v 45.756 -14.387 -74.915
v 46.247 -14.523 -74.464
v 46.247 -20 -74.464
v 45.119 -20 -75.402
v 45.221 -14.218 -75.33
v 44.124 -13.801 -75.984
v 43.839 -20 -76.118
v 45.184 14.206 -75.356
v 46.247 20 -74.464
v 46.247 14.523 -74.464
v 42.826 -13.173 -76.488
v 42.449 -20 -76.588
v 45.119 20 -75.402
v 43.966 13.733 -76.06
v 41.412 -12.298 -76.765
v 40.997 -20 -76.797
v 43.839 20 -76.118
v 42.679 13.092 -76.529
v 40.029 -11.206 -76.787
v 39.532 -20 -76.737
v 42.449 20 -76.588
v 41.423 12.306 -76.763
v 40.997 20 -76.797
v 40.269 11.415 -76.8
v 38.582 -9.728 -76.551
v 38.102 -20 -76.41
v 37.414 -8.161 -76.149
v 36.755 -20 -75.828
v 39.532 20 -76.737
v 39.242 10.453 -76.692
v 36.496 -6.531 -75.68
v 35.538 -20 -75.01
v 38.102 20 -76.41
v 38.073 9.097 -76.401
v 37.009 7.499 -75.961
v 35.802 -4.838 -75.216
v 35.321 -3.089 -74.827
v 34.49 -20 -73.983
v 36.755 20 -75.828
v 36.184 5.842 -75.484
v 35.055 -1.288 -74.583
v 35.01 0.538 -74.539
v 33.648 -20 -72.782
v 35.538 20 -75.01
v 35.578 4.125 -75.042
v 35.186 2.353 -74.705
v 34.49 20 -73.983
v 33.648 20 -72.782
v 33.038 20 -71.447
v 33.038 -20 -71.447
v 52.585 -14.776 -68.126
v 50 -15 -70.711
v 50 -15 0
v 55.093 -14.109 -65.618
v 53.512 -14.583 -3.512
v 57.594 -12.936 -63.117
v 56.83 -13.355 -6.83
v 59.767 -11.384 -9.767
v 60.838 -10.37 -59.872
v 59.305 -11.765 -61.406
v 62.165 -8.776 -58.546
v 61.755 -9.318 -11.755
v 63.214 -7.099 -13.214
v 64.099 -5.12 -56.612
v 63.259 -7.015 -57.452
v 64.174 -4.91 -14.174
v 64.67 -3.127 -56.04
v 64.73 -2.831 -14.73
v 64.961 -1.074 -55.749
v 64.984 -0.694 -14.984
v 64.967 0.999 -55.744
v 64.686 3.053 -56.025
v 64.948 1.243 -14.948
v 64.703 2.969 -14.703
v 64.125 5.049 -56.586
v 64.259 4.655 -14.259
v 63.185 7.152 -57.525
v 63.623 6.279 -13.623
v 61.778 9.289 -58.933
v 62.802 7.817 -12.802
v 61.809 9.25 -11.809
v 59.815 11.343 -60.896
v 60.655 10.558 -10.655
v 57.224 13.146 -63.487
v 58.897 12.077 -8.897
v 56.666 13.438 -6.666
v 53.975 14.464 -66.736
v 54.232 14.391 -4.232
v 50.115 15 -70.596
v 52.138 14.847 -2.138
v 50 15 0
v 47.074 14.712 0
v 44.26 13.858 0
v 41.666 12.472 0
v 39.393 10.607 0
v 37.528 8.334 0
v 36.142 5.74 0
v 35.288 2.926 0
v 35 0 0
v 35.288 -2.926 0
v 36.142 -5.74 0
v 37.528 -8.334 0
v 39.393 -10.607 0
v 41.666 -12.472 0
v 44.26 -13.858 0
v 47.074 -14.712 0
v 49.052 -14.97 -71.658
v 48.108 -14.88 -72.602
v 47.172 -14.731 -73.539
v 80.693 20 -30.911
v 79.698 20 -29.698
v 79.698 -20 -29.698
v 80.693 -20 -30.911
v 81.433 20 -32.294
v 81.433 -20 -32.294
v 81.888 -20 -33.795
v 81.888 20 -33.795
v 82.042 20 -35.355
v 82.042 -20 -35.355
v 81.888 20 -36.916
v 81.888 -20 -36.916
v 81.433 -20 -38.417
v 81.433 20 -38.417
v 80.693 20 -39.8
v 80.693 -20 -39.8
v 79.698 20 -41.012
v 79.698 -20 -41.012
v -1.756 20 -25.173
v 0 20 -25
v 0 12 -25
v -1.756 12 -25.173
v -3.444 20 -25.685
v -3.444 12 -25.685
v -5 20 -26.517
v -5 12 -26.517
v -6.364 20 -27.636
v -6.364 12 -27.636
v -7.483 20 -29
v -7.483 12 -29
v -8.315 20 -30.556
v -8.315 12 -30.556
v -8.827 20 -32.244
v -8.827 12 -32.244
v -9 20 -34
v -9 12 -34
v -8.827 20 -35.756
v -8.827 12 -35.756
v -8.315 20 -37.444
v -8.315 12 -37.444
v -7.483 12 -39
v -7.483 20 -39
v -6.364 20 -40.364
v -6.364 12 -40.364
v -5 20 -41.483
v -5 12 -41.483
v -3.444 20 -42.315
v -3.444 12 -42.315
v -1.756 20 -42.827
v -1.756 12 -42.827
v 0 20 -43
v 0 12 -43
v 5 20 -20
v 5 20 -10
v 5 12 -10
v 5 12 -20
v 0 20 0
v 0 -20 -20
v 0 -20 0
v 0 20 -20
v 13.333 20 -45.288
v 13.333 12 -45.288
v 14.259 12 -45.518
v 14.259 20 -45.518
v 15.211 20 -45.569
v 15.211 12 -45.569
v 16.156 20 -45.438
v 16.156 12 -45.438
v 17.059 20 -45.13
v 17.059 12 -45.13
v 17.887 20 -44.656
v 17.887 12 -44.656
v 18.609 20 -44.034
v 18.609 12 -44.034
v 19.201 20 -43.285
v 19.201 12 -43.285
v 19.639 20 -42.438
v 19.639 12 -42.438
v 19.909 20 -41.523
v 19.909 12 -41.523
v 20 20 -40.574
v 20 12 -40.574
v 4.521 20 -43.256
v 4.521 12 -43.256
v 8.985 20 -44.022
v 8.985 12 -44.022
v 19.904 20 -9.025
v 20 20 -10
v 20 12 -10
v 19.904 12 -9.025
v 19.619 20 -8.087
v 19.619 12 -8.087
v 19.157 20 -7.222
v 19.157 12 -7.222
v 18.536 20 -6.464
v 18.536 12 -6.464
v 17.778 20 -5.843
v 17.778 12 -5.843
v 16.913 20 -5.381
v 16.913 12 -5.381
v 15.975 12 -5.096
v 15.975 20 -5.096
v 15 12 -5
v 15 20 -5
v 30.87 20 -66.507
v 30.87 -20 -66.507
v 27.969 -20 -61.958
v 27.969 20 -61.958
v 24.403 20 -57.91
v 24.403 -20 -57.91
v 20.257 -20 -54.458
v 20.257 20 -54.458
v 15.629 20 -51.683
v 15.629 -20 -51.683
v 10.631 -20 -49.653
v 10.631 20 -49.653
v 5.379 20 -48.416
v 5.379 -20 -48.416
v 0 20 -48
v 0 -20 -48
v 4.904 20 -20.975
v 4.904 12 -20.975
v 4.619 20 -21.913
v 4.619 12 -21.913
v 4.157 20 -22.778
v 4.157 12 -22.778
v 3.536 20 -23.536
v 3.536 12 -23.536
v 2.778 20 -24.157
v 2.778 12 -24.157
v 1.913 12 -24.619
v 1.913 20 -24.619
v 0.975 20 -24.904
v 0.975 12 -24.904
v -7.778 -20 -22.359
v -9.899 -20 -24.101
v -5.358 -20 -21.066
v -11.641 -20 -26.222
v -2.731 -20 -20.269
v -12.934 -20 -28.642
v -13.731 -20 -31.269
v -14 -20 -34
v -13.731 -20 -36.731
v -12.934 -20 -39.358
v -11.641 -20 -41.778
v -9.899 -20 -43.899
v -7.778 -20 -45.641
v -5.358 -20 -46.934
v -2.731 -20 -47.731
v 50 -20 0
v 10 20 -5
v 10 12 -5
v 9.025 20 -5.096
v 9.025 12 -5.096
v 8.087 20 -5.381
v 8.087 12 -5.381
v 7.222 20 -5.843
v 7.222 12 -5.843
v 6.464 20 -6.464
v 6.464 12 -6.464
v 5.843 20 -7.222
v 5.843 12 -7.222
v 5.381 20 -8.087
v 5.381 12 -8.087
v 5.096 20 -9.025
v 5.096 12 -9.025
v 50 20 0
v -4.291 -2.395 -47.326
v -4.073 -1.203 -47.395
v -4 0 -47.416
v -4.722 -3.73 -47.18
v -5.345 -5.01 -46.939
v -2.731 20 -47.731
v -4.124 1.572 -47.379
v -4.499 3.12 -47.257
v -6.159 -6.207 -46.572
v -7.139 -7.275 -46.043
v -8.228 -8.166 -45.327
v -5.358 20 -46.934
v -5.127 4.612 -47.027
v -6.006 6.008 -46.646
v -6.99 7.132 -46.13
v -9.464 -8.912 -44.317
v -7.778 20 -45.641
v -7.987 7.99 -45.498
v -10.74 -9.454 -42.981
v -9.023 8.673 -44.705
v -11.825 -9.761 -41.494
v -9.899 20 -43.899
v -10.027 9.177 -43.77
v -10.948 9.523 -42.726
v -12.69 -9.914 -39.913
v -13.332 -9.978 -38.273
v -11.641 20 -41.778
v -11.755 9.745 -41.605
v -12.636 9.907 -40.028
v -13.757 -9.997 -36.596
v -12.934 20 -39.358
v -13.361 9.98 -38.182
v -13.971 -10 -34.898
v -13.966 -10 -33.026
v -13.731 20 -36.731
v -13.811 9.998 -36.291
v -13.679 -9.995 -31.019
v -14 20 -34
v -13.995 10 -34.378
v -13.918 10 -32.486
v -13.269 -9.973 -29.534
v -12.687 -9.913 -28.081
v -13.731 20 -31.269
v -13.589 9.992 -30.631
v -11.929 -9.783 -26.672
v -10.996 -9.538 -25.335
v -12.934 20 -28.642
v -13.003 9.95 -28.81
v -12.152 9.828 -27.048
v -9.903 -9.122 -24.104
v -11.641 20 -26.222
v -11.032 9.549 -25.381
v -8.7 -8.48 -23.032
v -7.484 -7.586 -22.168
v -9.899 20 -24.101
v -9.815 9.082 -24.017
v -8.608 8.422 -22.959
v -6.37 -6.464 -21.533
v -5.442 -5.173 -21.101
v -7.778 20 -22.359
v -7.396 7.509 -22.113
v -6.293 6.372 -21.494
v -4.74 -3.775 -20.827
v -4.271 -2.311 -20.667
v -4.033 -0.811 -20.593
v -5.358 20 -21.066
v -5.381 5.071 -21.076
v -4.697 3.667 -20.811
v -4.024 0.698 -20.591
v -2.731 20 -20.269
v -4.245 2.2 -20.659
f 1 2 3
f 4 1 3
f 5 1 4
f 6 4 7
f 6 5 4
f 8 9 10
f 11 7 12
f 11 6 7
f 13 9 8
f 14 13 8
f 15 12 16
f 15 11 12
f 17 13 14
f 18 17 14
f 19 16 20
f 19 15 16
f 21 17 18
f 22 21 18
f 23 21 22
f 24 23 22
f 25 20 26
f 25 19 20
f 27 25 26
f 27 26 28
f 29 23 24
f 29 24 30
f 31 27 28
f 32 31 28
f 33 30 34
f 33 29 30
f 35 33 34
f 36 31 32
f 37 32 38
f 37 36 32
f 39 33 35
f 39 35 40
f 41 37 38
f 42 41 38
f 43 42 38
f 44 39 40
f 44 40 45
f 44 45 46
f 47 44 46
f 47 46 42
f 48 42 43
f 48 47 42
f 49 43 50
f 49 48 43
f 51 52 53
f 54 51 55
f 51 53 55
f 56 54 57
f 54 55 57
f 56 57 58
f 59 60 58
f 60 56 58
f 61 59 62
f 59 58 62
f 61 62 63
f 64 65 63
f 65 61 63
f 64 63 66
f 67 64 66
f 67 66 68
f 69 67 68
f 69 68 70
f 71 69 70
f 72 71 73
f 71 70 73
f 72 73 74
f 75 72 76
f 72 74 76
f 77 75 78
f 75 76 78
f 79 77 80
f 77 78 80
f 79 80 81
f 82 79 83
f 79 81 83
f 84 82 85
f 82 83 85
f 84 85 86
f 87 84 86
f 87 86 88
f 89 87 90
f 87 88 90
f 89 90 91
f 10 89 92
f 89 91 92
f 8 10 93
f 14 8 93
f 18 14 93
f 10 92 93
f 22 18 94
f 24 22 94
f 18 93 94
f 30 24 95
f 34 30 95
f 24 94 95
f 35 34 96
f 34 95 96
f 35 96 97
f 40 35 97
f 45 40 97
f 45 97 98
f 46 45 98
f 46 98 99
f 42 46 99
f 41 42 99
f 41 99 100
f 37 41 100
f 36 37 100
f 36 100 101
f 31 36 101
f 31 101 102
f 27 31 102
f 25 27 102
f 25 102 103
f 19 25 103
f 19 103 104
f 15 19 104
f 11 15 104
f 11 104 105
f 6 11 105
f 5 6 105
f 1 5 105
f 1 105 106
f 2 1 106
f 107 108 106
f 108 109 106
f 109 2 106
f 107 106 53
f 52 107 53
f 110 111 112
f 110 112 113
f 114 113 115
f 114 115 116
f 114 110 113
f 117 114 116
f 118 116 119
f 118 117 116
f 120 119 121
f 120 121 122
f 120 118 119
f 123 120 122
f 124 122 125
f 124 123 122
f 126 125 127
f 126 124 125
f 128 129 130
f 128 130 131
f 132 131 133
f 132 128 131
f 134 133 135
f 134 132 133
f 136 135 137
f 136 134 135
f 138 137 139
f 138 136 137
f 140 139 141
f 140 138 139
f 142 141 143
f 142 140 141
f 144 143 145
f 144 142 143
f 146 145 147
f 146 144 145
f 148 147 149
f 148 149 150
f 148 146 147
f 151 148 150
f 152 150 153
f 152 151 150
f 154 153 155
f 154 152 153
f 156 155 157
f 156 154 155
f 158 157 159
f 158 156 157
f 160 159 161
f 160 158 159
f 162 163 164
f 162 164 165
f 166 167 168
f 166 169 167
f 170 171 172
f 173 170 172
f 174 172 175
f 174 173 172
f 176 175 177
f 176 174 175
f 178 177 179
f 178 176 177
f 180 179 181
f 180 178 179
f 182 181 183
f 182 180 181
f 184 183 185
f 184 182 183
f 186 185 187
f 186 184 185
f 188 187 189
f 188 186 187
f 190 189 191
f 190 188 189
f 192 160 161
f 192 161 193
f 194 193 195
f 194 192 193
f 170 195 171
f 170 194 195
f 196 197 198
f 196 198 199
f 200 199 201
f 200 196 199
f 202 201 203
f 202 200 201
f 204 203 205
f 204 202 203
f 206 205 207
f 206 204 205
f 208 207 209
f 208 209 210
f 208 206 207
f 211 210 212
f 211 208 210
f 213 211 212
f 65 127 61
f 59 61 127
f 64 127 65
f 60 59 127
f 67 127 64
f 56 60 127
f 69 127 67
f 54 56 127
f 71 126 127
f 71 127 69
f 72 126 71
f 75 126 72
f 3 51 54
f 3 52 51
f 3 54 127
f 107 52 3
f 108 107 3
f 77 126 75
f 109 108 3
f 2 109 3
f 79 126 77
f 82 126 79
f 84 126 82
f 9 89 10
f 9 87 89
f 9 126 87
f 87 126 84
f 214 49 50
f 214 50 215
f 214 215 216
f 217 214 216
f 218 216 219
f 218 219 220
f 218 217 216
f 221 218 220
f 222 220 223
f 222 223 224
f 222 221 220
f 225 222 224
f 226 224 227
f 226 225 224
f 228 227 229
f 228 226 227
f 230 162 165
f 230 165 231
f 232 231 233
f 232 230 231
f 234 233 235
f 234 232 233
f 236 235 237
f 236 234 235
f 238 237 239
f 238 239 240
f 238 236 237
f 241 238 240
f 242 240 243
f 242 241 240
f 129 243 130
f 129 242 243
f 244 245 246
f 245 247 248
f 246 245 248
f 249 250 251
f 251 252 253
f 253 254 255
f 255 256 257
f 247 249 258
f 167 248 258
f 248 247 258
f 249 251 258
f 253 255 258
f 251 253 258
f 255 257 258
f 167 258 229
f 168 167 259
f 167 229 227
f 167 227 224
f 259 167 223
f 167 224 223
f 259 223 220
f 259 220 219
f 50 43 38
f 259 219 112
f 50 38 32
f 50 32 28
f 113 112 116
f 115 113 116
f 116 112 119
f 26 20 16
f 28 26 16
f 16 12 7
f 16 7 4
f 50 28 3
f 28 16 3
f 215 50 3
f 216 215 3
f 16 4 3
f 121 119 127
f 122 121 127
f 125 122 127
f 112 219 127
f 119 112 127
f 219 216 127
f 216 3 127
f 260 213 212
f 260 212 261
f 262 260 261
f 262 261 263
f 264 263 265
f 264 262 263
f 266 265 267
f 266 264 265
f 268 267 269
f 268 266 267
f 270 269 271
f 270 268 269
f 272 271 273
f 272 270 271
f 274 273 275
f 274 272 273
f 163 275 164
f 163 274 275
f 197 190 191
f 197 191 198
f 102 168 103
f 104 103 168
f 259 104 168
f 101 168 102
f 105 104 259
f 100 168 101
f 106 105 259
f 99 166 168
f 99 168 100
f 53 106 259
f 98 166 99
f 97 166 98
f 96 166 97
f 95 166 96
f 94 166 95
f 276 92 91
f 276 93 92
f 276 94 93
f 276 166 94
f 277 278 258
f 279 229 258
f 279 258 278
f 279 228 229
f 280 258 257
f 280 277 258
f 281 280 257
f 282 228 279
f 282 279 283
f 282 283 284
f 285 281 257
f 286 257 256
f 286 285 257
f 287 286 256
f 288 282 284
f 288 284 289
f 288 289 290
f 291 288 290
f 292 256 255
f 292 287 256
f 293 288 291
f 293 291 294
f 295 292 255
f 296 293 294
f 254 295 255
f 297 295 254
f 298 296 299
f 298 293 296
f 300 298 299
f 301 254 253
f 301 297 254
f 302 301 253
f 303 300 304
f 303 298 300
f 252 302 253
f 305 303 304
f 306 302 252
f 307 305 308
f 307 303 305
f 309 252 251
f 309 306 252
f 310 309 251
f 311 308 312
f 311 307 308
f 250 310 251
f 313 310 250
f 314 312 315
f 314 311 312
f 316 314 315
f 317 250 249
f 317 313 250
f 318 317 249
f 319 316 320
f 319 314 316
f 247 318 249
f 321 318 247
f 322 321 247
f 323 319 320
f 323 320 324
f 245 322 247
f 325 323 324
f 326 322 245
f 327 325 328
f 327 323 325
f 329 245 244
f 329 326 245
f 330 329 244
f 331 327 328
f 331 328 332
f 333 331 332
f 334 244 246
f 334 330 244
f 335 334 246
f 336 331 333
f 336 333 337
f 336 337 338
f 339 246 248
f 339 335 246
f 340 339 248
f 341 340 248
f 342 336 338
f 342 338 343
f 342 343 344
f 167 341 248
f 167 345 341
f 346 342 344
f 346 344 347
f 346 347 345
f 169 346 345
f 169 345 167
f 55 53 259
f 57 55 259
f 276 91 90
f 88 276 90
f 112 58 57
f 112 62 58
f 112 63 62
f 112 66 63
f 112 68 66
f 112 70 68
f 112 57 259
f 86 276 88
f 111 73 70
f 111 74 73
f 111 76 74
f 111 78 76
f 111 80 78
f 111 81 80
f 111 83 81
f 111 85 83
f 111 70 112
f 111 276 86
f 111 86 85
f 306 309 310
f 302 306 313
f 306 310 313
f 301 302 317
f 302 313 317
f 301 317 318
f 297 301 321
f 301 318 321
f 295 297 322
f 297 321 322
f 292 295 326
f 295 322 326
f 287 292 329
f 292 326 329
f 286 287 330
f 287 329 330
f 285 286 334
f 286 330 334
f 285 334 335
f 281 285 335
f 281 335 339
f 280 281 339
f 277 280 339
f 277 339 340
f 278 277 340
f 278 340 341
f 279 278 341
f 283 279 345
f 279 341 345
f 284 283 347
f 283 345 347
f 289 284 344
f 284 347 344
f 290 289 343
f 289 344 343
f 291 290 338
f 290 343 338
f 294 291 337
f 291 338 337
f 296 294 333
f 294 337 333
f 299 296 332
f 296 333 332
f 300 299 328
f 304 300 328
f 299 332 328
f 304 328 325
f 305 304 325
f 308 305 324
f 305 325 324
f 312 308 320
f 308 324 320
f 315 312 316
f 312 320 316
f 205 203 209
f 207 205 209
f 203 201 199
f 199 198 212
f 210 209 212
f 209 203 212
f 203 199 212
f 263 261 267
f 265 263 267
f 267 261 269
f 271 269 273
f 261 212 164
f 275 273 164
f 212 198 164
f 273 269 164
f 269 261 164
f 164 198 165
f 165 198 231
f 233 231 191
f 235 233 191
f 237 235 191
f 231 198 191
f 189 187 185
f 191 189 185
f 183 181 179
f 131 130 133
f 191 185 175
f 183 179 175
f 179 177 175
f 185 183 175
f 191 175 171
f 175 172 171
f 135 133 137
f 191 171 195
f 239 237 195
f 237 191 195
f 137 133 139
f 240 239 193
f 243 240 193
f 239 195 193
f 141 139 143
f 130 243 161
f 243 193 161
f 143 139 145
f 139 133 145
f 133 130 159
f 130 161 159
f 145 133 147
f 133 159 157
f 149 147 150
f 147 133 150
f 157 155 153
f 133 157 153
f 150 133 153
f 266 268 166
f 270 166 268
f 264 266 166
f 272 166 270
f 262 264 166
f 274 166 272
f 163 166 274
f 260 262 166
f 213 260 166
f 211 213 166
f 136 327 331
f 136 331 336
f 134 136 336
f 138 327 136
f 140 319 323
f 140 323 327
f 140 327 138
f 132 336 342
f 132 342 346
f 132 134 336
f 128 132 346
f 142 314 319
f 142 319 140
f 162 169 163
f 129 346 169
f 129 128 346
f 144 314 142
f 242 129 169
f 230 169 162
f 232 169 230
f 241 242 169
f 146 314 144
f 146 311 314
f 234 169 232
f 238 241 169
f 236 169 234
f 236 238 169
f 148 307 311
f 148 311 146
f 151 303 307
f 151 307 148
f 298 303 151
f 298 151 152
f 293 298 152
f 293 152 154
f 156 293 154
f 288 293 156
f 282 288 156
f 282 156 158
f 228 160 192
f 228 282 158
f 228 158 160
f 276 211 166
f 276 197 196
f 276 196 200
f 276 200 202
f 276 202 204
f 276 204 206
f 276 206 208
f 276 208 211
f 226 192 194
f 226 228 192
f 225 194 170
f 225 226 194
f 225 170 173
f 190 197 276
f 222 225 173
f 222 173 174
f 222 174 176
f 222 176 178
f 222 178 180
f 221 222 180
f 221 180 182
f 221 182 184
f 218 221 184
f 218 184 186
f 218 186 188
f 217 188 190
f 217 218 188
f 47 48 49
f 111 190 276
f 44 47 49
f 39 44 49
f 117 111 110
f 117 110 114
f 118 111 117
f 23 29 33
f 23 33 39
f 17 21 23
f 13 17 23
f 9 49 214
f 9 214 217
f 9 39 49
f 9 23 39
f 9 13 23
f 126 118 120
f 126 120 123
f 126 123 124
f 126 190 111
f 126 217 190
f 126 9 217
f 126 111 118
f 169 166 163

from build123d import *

# Parameters (mm, degrees)
BOSS_EXTRU_1_DEPTH      = 20
ENL_V_MAT_EXTRU_1_DEPTH = 8
ESQUISSE3_R             = 15
ESQUISSE3_R_2           = 10
ENL_V_MAT_EXTRU_2_DEPTH = 115.149577324


with BuildPart() as part:
    # Esquisse1 → Boss.-Extru.1 (new, symmetric)
    with BuildSketch(Plane(origin=(0, 0, 0), x_dir=(1, 0, 0), z_dir=(0, 1, 0))):
        with BuildLine():
            Line((0, 0), (50, 0))
            Line((50, 0), (79.69848481, 29.69848481))
            ThreePointArc((79.69848481, 29.69848481), (82.04163056, 35.355339059), (79.69848481, 41.012193309))
            Line((79.69848481, 41.012193309), (46.246943589, 74.463734529))
            ThreePointArc((46.246943589, 74.463734529), (38.809068701, 76.606108799), (33.038444811, 71.447460693))
            ThreePointArc((33.038444811, 71.447460693), (20.256617737, 54.457585283), (0, 48))
            ThreePointArc((0, 48), (-14, 34), (0, 20))
            Line((0, 20), (0, 0))
        make_face()
    extrude(amount=BOSS_EXTRU_1_DEPTH, both=True)

    # Esquisse2 → Enlèv. mat.-Extru.1 (cut)
    with BuildSketch(Plane(origin=(0, 20, 0), x_dir=(1, 0, 0), z_dir=(0, 1, 0))):
        with BuildLine():
            Line((20, 40.573593129), (20, 10))
            ThreePointArc((20, 10), (18.535533906, 6.464466094), (15, 5))
            Line((15, 5), (10, 5))
            ThreePointArc((10, 5), (6.464466094, 6.464466094), (5, 10))
            Line((5, 10), (5, 20))
            ThreePointArc((5, 20), (3.535533906, 23.535533906), (0, 25))
            ThreePointArc((0, 25), (-9, 34), (0, 43))
            ThreePointArc((0, 43), (6.764079149, 43.576057614), (13.333333333, 45.287638337))
            ThreePointArc((13.333333333, 45.287638337), (17.886751346, 44.656076033), (20, 40.573593129))
        make_face()
    extrude(amount=-ENL_V_MAT_EXTRU_1_DEPTH, mode=Mode.SUBTRACT)

    # Esquisse3 → Enlèv. mat.-Extru.2 (cut, through all)
    with BuildSketch(Plane.XY):
        with Locations(Location((50, 0, 0), (0, 0, 270))):
            Circle(ESQUISSE3_R)
        with Locations((-14, 0)):
            Circle(ESQUISSE3_R_2)
    extrude(amount=-ENL_V_MAT_EXTRU_2_DEPTH, mode=Mode.SUBTRACT)


solid = part.part
